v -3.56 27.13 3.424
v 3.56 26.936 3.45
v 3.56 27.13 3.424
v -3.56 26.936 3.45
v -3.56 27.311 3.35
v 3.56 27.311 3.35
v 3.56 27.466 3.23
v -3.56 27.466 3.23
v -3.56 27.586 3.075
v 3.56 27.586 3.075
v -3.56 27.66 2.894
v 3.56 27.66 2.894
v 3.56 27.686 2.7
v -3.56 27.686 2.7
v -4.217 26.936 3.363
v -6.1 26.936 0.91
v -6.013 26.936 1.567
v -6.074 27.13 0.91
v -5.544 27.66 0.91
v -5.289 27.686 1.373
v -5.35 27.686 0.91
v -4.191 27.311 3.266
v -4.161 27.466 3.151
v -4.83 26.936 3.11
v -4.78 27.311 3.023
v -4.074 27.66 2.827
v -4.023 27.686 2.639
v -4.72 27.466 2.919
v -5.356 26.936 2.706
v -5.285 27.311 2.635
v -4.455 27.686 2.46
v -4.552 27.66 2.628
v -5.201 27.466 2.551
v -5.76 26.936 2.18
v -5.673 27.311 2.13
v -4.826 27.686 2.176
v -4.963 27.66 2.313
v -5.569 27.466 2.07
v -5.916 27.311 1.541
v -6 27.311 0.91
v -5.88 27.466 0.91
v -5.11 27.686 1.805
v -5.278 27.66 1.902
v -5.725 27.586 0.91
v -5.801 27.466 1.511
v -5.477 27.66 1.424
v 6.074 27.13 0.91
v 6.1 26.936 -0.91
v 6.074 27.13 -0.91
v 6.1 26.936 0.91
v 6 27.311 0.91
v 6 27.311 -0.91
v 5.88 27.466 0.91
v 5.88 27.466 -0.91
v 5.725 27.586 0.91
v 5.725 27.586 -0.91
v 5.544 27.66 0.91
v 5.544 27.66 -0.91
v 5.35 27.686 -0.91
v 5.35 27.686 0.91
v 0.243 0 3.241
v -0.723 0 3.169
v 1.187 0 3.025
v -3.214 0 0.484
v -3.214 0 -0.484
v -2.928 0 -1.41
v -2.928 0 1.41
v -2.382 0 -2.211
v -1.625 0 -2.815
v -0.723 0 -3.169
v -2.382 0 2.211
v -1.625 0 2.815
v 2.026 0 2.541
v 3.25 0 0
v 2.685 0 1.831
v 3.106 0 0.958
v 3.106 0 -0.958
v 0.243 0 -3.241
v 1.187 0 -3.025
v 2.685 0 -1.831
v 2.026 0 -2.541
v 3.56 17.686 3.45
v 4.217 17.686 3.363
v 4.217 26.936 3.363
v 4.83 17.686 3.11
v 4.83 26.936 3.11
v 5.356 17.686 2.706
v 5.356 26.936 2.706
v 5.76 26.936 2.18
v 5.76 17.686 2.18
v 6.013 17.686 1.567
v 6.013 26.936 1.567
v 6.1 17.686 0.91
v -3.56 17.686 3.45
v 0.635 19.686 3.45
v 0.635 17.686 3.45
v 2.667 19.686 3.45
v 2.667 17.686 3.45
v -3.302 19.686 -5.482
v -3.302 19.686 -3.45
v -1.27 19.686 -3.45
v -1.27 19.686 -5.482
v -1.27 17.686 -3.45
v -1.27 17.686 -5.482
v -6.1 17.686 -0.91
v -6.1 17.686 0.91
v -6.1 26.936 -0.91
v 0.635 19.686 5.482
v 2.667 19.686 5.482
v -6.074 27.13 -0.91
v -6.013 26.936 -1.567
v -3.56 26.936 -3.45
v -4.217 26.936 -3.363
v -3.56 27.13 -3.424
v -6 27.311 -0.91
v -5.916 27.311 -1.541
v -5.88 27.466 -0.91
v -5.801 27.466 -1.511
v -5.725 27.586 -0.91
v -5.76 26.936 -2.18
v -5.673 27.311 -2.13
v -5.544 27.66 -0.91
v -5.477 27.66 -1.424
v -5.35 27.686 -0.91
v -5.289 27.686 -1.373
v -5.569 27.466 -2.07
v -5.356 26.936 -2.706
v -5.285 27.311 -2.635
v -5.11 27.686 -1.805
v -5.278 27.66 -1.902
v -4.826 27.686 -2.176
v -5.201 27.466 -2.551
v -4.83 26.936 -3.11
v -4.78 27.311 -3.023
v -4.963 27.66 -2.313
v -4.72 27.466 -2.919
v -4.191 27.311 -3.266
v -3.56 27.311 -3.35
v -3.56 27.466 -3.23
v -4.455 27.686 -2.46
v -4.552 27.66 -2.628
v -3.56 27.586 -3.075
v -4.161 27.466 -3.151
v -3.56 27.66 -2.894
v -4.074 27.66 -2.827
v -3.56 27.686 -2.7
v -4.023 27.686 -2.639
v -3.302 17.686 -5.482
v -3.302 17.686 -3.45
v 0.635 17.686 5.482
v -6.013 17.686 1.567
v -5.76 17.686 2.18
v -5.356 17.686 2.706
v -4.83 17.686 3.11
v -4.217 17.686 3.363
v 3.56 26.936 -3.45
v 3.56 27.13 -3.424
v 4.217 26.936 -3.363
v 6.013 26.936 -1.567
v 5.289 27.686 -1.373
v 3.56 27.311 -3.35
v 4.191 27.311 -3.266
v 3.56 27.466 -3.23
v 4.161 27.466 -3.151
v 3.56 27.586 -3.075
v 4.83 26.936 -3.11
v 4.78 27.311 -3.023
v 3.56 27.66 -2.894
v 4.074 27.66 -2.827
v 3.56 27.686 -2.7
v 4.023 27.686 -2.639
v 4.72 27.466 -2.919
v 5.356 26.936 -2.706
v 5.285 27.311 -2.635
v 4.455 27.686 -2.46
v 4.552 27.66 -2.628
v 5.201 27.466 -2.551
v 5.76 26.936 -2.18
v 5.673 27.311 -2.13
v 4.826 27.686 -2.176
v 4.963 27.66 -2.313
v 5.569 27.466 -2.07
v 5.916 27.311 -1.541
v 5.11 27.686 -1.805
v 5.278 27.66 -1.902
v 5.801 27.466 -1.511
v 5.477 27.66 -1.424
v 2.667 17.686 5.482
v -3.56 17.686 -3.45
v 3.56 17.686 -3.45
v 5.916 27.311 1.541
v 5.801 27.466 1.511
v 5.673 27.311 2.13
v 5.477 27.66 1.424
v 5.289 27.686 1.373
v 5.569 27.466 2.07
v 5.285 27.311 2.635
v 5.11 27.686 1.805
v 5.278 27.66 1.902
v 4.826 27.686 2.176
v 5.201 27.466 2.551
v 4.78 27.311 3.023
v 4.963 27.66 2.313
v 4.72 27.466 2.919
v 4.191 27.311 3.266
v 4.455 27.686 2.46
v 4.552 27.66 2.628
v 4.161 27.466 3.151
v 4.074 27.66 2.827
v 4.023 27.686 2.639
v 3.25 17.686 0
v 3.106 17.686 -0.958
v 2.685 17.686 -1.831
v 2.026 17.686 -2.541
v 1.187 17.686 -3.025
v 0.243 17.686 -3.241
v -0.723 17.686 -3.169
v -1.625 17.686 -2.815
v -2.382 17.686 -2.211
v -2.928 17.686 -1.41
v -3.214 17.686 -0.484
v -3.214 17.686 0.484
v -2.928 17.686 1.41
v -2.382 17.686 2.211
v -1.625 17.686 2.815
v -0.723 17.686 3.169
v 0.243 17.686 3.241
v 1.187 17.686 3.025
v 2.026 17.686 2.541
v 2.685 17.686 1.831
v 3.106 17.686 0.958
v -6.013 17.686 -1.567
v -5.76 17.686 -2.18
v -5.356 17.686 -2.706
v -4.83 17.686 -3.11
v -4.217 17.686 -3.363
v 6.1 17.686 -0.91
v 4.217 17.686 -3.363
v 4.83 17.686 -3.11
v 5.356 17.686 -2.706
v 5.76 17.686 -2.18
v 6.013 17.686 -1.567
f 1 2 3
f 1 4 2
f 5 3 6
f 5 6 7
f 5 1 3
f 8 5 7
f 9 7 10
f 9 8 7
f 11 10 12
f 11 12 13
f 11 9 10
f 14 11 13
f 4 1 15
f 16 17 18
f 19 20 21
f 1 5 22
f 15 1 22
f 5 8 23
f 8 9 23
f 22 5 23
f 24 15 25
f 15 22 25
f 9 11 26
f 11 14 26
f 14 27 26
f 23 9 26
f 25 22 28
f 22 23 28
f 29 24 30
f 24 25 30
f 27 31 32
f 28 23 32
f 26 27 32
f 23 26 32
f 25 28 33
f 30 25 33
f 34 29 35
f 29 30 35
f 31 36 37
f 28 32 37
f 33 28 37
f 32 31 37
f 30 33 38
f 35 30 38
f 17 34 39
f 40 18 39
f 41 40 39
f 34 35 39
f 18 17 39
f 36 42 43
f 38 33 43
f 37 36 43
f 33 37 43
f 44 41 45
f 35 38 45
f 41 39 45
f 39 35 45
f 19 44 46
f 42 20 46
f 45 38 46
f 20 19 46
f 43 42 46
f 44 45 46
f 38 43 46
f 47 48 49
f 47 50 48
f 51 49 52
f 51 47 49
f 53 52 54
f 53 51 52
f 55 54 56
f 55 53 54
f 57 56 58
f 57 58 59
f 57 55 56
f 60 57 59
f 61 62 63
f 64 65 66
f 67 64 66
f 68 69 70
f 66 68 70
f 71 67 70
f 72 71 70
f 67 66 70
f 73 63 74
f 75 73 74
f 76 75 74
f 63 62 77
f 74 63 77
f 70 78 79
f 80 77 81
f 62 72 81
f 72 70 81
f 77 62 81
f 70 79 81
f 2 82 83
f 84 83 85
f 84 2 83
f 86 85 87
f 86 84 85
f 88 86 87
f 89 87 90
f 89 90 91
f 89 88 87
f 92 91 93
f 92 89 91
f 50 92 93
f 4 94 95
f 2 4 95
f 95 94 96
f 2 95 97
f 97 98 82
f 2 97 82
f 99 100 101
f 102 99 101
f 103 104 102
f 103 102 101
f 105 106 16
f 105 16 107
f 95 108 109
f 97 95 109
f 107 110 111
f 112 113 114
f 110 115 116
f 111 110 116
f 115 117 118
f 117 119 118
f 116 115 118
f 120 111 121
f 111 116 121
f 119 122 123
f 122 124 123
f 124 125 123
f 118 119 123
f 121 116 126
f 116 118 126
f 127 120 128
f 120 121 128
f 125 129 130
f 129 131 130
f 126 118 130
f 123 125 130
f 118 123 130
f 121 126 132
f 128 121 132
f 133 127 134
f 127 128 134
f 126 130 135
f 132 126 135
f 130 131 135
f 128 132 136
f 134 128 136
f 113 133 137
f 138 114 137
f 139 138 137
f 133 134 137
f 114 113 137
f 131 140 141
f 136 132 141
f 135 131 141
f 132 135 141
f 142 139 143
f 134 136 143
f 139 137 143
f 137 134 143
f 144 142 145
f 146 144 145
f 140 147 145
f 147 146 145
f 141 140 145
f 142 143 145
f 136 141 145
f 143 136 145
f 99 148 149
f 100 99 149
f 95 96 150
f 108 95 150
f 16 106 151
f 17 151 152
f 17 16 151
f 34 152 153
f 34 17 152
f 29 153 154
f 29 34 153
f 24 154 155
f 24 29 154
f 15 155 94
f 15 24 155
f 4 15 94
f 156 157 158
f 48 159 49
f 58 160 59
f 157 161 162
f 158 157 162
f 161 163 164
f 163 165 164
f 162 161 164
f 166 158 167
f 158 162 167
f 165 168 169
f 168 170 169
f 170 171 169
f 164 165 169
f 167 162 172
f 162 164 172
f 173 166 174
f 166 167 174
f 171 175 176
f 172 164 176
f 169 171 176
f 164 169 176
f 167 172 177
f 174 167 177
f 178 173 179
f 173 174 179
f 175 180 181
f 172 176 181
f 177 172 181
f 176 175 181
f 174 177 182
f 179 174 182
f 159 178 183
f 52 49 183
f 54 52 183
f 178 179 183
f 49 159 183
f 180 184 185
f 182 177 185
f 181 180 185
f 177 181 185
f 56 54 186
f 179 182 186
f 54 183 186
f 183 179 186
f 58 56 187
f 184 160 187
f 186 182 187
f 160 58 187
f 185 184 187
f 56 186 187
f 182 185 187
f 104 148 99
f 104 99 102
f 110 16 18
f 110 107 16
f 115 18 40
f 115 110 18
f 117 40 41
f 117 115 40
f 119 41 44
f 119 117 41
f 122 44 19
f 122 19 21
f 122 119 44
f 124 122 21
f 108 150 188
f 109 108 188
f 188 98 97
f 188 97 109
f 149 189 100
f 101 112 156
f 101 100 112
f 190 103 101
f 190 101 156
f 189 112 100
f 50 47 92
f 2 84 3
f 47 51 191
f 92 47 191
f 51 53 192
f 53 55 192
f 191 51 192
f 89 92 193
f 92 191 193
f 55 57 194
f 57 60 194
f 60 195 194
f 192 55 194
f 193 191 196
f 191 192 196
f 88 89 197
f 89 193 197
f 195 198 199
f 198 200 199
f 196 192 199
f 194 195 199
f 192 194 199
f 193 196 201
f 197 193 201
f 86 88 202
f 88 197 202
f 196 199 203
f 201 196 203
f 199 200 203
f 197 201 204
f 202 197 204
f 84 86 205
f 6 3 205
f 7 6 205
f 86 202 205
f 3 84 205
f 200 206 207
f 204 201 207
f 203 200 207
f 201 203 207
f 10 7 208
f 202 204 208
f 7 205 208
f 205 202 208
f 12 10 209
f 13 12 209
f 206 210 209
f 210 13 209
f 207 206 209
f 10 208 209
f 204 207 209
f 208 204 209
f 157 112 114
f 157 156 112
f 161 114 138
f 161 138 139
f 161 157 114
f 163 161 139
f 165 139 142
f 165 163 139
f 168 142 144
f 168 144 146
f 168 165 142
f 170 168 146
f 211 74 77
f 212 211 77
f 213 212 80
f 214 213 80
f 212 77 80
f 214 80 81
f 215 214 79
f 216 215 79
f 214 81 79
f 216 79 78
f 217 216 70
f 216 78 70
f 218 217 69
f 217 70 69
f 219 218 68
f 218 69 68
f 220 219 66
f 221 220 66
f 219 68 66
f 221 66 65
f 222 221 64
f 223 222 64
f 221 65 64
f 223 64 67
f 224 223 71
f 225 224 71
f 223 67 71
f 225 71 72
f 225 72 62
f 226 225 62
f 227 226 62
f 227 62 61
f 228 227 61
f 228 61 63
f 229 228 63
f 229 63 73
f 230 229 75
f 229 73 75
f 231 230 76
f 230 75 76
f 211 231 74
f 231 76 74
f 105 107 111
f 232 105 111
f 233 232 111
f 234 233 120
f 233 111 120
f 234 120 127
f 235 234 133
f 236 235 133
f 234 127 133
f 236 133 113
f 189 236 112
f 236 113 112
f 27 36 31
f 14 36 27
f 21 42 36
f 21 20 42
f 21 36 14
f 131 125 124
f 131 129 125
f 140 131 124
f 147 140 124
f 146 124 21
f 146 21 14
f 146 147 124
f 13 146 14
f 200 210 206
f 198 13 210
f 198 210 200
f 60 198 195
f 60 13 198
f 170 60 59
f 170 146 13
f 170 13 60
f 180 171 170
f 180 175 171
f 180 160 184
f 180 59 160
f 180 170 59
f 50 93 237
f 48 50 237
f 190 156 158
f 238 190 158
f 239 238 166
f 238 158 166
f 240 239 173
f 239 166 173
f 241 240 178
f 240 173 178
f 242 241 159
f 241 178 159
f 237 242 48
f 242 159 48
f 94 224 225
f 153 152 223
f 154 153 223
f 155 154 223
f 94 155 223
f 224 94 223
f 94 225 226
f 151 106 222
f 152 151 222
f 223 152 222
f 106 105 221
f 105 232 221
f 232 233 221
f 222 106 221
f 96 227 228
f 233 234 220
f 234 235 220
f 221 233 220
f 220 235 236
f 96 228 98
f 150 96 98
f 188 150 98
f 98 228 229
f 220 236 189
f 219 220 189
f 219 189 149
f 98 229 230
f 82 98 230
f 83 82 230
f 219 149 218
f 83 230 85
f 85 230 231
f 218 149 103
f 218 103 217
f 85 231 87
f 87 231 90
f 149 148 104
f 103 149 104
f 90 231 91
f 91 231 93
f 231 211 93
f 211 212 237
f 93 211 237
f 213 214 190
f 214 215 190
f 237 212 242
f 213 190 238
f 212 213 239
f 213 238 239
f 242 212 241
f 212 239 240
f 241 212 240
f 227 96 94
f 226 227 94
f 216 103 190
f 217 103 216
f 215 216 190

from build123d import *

# Parameters (mm, degrees)
SKETCH1_R           = 3.25
BOSS_EXTRUDE1_DEPTH = 17.686
SKETCH3_W           = 12.2
SKETCH3_H           = 6.9
BOSS_EXTRUDE2_DEPTH = 10
FILLET1_R           = 2.54
FILLET2_R           = 0.75
SKETCH5_W           = 2.032
SKETCH5_H           = 2.032
BOSS_EXTRUDE3_DEPTH = 2


with BuildPart() as part:
    # Sketch1 → Boss-Extrude1 (new body)
    with BuildSketch(Plane(origin=(0, 0, 0), x_dir=(1, 0, 0), z_dir=(0, 1, 0))):
        Circle(SKETCH1_R)
    extrude(amount=BOSS_EXTRUDE1_DEPTH)

    # Sketch3 → Boss-Extrude2 (add)
    with BuildSketch(Plane(origin=(0, 17.686, 0), x_dir=(1, 0, 0), z_dir=(0, 1, 0))):
        Rectangle(SKETCH3_W, SKETCH3_H)
    extrude(amount=BOSS_EXTRUDE2_DEPTH)

    # Fillet1
    fillet1_edges = [part.edges().sort_by_distance(p)[0] for p in [
        (6.1, 22.686, 3.45),
        (6.1, 22.686, -3.45),
        (-6.1, 22.686, -3.45),
        (-6.1, 22.686, 3.45),
    ]]
    fillet(fillet1_edges, radius=FILLET1_R)

    # Fillet2
    fillet2_edges = [part.edges().sort_by_distance(p)[0] for p in [
        (-6.1, 27.686, 0),
        (0, 27.686, -3.45),
        (6.1, 27.686, 0),
        (0, 27.686, 3.45),
        (-5.356051224, 27.686, 2.706051224),
        (5.356051224, 27.686, 2.706051224),
        (5.356051224, 27.686, -2.706051224),
        (-5.356051224, 27.686, -2.706051224),
    ]]
    fillet(fillet2_edges, radius=FILLET2_R)

    # Sketch5 → Boss-Extrude3 (add)
    with BuildSketch(Plane.XZ.offset(-17.686)):
        with Locations((-2.286, -4.466)):
            Rectangle(SKETCH5_W, SKETCH5_H)
        with Locations((1.651, 4.466)):
            Rectangle(SKETCH5_W, SKETCH5_H)
    extrude(amount=-BOSS_EXTRUDE3_DEPTH)


solid = part.part
